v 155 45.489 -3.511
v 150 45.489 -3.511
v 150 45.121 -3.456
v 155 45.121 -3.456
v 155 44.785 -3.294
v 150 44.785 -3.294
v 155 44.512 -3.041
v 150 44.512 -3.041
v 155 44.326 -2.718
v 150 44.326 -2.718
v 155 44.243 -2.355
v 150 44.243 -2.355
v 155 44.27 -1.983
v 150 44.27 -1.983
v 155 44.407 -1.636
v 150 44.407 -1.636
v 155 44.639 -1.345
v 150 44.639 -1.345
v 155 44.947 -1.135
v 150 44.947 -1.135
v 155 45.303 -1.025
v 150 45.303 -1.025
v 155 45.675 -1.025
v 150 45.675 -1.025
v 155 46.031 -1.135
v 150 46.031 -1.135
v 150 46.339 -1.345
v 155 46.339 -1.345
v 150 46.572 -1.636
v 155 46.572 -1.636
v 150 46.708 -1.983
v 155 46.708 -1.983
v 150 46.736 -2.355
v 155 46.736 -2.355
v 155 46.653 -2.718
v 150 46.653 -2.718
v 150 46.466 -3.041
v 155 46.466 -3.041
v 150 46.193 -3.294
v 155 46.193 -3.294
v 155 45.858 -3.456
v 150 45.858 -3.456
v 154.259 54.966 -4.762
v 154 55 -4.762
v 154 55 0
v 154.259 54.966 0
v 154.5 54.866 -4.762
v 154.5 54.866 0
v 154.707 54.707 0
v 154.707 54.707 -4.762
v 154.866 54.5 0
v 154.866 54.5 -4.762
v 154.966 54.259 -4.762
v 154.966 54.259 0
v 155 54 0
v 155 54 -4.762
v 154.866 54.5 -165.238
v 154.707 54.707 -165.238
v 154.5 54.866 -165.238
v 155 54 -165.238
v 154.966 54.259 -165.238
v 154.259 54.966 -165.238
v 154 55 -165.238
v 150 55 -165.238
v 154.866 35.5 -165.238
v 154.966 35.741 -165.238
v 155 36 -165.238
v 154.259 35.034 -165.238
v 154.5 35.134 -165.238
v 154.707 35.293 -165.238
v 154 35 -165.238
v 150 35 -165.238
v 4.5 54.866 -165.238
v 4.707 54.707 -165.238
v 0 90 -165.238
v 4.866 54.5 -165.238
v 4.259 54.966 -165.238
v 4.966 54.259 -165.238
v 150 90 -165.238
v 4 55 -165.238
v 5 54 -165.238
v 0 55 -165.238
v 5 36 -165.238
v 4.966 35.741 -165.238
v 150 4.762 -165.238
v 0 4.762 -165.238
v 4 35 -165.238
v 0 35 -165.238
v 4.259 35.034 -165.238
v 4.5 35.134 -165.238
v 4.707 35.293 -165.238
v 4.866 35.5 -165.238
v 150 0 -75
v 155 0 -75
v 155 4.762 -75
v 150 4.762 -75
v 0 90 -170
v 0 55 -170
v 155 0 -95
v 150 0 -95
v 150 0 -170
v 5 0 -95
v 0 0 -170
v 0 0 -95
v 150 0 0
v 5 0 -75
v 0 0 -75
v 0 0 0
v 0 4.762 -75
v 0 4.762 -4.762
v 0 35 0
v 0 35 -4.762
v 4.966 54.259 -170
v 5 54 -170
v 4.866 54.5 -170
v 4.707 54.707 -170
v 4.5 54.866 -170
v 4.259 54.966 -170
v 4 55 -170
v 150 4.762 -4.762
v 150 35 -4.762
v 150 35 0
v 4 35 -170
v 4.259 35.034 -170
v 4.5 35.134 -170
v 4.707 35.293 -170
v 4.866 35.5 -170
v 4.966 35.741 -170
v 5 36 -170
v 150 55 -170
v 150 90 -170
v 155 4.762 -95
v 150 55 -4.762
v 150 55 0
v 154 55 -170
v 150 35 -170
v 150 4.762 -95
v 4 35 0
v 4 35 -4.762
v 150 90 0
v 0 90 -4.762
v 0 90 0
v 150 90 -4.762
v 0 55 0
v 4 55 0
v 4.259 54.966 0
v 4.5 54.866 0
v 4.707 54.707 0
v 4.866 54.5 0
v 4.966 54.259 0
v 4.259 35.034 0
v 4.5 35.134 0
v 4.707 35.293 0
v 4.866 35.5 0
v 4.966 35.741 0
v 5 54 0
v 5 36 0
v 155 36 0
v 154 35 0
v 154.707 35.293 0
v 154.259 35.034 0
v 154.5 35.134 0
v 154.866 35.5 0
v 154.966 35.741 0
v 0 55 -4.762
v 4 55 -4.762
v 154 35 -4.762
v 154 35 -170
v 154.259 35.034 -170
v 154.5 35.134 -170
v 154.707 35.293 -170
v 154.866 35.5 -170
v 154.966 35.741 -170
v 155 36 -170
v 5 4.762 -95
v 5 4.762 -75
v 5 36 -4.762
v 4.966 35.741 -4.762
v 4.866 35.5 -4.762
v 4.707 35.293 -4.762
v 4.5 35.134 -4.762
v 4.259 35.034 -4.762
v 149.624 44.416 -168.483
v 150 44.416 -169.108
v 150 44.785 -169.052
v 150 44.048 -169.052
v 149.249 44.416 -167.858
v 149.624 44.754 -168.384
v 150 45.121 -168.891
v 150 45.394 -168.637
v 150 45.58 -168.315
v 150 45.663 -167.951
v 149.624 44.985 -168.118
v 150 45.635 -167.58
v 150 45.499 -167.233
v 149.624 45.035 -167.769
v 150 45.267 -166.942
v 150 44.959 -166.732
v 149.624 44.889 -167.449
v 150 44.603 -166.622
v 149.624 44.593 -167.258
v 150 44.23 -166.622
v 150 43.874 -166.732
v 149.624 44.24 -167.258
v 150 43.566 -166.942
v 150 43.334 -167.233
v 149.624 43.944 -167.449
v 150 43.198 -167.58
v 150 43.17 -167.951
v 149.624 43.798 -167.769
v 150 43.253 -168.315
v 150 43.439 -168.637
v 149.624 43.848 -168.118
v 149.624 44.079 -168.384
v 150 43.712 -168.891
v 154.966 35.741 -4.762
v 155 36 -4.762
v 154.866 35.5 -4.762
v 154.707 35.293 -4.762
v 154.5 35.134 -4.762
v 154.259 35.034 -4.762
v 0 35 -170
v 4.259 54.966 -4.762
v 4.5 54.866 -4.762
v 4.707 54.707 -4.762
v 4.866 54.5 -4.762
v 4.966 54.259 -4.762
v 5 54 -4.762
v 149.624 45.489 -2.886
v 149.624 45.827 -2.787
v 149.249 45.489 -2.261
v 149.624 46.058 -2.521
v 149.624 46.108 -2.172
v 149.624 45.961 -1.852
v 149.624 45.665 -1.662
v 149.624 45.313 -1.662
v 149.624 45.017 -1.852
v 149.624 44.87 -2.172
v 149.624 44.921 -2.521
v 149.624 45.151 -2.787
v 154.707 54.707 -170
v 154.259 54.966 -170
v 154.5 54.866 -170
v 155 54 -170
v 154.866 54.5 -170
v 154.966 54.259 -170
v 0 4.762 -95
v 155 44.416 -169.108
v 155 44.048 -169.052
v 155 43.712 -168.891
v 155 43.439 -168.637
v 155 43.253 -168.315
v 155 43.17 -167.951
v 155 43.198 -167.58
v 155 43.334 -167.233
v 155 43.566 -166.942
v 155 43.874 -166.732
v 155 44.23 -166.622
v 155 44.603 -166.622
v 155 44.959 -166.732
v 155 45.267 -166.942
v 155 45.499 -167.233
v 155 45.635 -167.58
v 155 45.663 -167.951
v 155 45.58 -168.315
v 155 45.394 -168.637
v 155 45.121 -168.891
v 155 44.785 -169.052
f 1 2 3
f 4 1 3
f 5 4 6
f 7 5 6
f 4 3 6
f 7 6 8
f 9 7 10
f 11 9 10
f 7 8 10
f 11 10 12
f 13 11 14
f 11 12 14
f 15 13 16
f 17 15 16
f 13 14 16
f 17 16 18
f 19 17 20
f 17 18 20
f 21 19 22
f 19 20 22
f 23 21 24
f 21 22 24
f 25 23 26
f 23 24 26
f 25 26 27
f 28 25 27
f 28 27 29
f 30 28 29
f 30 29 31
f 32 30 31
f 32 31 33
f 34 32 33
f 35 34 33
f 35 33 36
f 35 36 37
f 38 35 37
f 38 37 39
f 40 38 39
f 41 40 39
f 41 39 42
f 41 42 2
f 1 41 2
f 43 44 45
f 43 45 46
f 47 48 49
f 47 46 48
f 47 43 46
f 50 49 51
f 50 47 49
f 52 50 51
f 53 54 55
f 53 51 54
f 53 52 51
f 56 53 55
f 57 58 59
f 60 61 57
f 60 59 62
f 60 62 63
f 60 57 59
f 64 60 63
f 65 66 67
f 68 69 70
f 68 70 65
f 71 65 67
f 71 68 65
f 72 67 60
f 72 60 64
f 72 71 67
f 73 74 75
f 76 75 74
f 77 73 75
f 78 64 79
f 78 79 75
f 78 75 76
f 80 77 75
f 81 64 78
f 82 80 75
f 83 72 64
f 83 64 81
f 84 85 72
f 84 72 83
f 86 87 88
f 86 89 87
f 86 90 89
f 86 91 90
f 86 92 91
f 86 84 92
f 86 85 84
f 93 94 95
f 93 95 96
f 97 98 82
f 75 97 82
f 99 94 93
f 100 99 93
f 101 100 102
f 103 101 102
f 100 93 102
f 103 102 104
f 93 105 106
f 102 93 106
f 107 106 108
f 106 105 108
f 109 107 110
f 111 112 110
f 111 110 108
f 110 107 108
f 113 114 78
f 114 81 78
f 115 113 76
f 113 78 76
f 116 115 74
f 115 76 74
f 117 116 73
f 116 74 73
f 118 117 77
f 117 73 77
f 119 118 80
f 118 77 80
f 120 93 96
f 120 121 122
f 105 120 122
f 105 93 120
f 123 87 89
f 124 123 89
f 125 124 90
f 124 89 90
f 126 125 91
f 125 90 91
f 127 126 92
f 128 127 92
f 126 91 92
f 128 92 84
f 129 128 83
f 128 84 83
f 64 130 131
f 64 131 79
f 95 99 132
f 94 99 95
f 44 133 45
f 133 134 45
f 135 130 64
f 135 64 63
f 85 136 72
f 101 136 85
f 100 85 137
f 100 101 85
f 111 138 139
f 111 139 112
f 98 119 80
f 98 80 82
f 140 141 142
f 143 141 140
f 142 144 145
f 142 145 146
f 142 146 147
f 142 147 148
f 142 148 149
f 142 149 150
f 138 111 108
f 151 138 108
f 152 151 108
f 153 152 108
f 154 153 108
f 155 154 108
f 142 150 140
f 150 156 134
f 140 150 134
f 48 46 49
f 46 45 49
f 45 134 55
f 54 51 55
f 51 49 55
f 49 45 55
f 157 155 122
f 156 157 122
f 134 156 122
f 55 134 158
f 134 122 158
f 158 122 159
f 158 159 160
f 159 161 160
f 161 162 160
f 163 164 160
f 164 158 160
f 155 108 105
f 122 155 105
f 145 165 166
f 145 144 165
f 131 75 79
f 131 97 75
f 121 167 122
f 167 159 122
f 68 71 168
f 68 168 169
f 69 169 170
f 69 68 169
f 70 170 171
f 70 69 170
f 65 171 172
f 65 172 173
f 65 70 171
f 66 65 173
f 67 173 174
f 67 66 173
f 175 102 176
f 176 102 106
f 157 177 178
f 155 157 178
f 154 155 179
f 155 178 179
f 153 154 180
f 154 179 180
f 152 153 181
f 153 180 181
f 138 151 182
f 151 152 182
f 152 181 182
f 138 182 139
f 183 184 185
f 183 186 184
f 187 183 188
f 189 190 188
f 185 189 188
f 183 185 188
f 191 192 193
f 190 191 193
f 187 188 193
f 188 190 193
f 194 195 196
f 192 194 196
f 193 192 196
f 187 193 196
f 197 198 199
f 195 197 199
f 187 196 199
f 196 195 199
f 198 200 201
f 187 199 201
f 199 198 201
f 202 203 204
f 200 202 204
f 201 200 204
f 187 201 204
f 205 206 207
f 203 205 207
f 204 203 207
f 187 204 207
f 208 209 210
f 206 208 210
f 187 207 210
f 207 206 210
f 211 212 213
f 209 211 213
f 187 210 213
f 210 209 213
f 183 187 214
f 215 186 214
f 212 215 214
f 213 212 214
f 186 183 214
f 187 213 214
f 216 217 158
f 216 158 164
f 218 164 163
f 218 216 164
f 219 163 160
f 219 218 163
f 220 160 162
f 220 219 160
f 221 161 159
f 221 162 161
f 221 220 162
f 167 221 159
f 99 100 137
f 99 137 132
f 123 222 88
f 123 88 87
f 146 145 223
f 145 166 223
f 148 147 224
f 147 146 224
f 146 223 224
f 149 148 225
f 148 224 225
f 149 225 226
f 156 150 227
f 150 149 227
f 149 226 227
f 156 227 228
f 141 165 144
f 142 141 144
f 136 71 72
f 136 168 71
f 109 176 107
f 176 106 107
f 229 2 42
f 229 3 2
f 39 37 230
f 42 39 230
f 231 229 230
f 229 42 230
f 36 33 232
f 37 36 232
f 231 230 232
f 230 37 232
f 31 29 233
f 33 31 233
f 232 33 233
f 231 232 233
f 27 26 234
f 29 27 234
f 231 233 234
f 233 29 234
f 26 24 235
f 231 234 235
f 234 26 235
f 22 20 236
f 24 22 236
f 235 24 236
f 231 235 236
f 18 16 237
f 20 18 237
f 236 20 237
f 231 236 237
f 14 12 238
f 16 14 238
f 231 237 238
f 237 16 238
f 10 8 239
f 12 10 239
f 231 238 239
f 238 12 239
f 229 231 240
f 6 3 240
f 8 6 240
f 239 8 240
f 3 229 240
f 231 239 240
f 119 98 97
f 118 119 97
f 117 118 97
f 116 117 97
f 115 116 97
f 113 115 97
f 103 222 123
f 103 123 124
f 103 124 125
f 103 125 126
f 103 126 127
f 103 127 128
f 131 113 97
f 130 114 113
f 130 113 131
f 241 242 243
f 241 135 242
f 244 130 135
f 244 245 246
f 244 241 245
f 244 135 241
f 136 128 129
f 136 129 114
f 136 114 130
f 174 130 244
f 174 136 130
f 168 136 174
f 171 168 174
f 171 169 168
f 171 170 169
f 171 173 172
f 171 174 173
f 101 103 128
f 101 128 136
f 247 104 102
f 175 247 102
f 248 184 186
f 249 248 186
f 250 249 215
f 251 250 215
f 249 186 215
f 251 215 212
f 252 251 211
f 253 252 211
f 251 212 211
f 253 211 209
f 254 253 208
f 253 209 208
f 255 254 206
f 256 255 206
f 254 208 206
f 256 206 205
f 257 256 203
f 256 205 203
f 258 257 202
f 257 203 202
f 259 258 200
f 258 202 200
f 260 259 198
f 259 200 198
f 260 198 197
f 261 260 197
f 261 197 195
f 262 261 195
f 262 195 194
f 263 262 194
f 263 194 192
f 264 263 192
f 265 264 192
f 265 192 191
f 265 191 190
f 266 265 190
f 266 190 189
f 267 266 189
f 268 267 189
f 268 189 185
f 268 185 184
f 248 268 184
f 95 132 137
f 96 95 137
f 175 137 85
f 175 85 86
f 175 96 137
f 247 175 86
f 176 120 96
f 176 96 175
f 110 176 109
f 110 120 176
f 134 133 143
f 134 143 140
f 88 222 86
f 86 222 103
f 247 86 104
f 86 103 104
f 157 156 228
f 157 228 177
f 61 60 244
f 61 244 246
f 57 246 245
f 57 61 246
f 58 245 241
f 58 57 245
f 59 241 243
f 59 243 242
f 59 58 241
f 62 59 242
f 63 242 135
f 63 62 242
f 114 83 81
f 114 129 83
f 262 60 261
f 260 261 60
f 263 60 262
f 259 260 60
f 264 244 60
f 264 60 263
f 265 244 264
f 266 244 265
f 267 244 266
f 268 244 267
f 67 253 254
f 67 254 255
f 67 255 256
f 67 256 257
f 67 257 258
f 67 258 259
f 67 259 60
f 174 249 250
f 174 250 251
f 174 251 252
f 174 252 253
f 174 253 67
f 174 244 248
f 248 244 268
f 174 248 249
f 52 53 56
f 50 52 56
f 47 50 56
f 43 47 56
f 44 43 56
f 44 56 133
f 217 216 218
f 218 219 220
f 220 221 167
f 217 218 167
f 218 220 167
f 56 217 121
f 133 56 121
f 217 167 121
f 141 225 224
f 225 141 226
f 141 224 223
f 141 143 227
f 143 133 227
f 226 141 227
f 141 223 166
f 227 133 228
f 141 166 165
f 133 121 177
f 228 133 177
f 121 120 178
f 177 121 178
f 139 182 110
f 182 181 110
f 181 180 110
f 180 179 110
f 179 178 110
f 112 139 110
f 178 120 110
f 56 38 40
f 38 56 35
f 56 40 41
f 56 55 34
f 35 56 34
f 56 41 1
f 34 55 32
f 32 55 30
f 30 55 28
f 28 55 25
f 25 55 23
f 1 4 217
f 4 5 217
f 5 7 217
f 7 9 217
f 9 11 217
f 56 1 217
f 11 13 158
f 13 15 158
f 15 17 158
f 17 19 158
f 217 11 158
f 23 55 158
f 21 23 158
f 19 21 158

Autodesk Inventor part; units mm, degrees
ref_plane "YZ Plane" through (0, 0, 0) normal (1, 0, 0) x (0, 1, 0)
ref_plane "XZ Plane" through (0, 0, 0) normal (0, 1, 0) x (-1, 0, 0)
ref_plane "XY Plane" through (0, 0, 0) normal (0, 0, 1) x (1, 0, 0)
sketch "Sketch1" plane through (0, 0, 0) normal (0, 1, 0) x (-1, 0, 0)
  line L0 (0, 0) -> (-150, 0)
  line L1 (0, -170) -> (-150, -170)
  line L2 (-150, -170) -> (-150, -95)
  line L3 (-150, -95) -> (-155, -95)
  line L4 (-155, -95) -> (-155, -75)
  line L5 (-155, -75) -> (-150, -75)
  line L6 (-150, -75) -> (-150, 0)
  line L7 (0, -170) -> (0, -95)
  line L8 (0, -95) -> (-5, -95)
  line L9 (-5, -95) -> (-5, -75)
  line L10 (-5, -75) -> (0, -75)
  line L11 (0, -75) -> (0, 0)
  dimension "d0" = 150
  dimension "d1" = 170
  dimension "d2" = 5
  dimension "d3" = 5
  dimension "d4" = 75
  dimension "d5" = 75
  dimension "d6" = 20
  dimension "d9" = 0
  dimension "d10" = 75
  dimension "d11" = 5
  dimension "d12" = 75
  dimension "d13" = 20
  dimension "d14" = 150
  dimension "d15" = 0
extrude "Extrusion1" add sketch "Sketch1" along normal blind 4.7625
sketch "Sketch2" plane through (0, 4.7625, 0) normal (0, 1, 0) x (1, 0, 0)
  line L0 (0, 0) -> (150, 0) projected
  line L1 (0, 0) -> (150, 0)
  line L2 (150, 0) -> (150, 4.7625)
  line L3 (150, 0) -> (150, 75) projected
  line L4 (150, 4.7625) -> (0, 4.7625)
  line L5 (0, 75) -> (0, 0) projected
  line L6 (0, 0) -> (0, 4.7625)
  line L7 (150, 170) -> (0, 170) projected
  line L8 (0, 170) -> (150, 170)
  line L9 (150, 170) -> (150, 165.2375)
  line L10 (150, 95) -> (150, 170) projected
  line L11 (150, 165.2375) -> (0, 165.2375)
  line L12 (0, 170) -> (0, 95) projected
  line L13 (0, 170) -> (0, 165.2375)
  dimension "d18" = 4.7625
  dimension "d19" = 4.7625
extrude "Extrusion2" add sketch "Sketch2" along normal blind 85.2375
sketch "Sketch3" plane through (0, 0, 0) normal (0, 0, 1) x (1, 0, 0)
  line L0 (0, 0) -> (0, 90) projected
  line L1 (0, 55) -> (5, 55)
  line L2 (5, 55) -> (5, 35)
  line L3 (5, 35) -> (0, 35)
  line L4 (0, 55) -> (0, 35)
  line L5 (0, 90) -> (150, 90) projected
  line L6 (0, 0) -> (150, 0) projected
  dimension "d22" = 20
  dimension "d23" = 5
  dimension "d24" = 35
  dimension "d25" = 35
extrude "Extrusion3" cut sketch "Sketch3" against normal blind 4.7625
sketch "Sketch4" plane through (150, 0, -170) normal (0, 0, -1) x (-1, 0, 0)
  line L0 (150, 0) -> (150, 90) projected
  line L1 (150, 35) -> (145, 35)
  line L2 (145, 35) -> (145, 55)
  line L3 (145, 55) -> (150, 55)
  line L4 (150, 55) -> (150, 35)
  line L5 (0, 90) -> (150, 90) projected
  line L6 (0, 0) -> (150, 0) projected
  dimension "d28" = 20
  dimension "d29" = 5
  dimension "d30" = 35
  dimension "d31" = 35
extrude "Extrusion4" cut sketch "Sketch4" against normal blind 4.7625
sketch "Sketch5" plane through (0, 0, 0) normal (0, 0, 1) x (1, 0, 0)
  line L0 (150, 0) -> (150, 90) projected
  line L1 (150, 55) -> (155, 55)
  line L2 (155, 55) -> (155, 35)
  line L3 (155, 35) -> (150, 35)
  line L4 (150, 35) -> (150, 55)
  line L5 (0, 0) -> (150, 0) projected
  line L6 (0, 90) -> (150, 90) projected
  dimension "d34" = 20
  dimension "d35" = 5
  dimension "d36" = 35
  dimension "d37" = 35
extrude "Extrusion5" add sketch "Sketch5" against normal blind 4.7625
sketch "Sketch6" plane through (150, 0, -170) normal (0, 0, -1) x (-1, 0, 0)
  line L0 (0, 55) -> (-5, 55) projected
  line L1 (0, 55) -> (-5, 55)
  line L2 (-5, 55) -> (-5, 35)
  line L3 (0, 4.7625) -> (0, 35) projected
  line L4 (-5, 35) -> (0, 35)
  line L5 (0, 35) -> (0, 55)
  point P0 (150, 0)
extrude "Extrusion6" add sketch "Sketch6" against normal blind 4.7625
fillet "Fillet1" radius 1 4 edges at (5, 35, -167.6188) (5, 55, -167.6188) (5, 55, -2.3813) (5, 35, -2.3813)
fillet "Fillet2" radius 1 4 edges at (155, 55, -2.3813) (155, 35, -2.3813) (155, 55, -167.6188) (155, 35, -167.6188)
hole "Hole1" at (155, 45.4891, -2.2612) direction (-1, 0, 0) diameter 2.5 depth 5 tip angle 118
hole "Hole2" at (155, 44.4165, -167.8579) direction (-1, 0, 0) diameter 2.5 depth 5 tip angle 118
properties part number "OpticalDeviceLensPart (1)"
